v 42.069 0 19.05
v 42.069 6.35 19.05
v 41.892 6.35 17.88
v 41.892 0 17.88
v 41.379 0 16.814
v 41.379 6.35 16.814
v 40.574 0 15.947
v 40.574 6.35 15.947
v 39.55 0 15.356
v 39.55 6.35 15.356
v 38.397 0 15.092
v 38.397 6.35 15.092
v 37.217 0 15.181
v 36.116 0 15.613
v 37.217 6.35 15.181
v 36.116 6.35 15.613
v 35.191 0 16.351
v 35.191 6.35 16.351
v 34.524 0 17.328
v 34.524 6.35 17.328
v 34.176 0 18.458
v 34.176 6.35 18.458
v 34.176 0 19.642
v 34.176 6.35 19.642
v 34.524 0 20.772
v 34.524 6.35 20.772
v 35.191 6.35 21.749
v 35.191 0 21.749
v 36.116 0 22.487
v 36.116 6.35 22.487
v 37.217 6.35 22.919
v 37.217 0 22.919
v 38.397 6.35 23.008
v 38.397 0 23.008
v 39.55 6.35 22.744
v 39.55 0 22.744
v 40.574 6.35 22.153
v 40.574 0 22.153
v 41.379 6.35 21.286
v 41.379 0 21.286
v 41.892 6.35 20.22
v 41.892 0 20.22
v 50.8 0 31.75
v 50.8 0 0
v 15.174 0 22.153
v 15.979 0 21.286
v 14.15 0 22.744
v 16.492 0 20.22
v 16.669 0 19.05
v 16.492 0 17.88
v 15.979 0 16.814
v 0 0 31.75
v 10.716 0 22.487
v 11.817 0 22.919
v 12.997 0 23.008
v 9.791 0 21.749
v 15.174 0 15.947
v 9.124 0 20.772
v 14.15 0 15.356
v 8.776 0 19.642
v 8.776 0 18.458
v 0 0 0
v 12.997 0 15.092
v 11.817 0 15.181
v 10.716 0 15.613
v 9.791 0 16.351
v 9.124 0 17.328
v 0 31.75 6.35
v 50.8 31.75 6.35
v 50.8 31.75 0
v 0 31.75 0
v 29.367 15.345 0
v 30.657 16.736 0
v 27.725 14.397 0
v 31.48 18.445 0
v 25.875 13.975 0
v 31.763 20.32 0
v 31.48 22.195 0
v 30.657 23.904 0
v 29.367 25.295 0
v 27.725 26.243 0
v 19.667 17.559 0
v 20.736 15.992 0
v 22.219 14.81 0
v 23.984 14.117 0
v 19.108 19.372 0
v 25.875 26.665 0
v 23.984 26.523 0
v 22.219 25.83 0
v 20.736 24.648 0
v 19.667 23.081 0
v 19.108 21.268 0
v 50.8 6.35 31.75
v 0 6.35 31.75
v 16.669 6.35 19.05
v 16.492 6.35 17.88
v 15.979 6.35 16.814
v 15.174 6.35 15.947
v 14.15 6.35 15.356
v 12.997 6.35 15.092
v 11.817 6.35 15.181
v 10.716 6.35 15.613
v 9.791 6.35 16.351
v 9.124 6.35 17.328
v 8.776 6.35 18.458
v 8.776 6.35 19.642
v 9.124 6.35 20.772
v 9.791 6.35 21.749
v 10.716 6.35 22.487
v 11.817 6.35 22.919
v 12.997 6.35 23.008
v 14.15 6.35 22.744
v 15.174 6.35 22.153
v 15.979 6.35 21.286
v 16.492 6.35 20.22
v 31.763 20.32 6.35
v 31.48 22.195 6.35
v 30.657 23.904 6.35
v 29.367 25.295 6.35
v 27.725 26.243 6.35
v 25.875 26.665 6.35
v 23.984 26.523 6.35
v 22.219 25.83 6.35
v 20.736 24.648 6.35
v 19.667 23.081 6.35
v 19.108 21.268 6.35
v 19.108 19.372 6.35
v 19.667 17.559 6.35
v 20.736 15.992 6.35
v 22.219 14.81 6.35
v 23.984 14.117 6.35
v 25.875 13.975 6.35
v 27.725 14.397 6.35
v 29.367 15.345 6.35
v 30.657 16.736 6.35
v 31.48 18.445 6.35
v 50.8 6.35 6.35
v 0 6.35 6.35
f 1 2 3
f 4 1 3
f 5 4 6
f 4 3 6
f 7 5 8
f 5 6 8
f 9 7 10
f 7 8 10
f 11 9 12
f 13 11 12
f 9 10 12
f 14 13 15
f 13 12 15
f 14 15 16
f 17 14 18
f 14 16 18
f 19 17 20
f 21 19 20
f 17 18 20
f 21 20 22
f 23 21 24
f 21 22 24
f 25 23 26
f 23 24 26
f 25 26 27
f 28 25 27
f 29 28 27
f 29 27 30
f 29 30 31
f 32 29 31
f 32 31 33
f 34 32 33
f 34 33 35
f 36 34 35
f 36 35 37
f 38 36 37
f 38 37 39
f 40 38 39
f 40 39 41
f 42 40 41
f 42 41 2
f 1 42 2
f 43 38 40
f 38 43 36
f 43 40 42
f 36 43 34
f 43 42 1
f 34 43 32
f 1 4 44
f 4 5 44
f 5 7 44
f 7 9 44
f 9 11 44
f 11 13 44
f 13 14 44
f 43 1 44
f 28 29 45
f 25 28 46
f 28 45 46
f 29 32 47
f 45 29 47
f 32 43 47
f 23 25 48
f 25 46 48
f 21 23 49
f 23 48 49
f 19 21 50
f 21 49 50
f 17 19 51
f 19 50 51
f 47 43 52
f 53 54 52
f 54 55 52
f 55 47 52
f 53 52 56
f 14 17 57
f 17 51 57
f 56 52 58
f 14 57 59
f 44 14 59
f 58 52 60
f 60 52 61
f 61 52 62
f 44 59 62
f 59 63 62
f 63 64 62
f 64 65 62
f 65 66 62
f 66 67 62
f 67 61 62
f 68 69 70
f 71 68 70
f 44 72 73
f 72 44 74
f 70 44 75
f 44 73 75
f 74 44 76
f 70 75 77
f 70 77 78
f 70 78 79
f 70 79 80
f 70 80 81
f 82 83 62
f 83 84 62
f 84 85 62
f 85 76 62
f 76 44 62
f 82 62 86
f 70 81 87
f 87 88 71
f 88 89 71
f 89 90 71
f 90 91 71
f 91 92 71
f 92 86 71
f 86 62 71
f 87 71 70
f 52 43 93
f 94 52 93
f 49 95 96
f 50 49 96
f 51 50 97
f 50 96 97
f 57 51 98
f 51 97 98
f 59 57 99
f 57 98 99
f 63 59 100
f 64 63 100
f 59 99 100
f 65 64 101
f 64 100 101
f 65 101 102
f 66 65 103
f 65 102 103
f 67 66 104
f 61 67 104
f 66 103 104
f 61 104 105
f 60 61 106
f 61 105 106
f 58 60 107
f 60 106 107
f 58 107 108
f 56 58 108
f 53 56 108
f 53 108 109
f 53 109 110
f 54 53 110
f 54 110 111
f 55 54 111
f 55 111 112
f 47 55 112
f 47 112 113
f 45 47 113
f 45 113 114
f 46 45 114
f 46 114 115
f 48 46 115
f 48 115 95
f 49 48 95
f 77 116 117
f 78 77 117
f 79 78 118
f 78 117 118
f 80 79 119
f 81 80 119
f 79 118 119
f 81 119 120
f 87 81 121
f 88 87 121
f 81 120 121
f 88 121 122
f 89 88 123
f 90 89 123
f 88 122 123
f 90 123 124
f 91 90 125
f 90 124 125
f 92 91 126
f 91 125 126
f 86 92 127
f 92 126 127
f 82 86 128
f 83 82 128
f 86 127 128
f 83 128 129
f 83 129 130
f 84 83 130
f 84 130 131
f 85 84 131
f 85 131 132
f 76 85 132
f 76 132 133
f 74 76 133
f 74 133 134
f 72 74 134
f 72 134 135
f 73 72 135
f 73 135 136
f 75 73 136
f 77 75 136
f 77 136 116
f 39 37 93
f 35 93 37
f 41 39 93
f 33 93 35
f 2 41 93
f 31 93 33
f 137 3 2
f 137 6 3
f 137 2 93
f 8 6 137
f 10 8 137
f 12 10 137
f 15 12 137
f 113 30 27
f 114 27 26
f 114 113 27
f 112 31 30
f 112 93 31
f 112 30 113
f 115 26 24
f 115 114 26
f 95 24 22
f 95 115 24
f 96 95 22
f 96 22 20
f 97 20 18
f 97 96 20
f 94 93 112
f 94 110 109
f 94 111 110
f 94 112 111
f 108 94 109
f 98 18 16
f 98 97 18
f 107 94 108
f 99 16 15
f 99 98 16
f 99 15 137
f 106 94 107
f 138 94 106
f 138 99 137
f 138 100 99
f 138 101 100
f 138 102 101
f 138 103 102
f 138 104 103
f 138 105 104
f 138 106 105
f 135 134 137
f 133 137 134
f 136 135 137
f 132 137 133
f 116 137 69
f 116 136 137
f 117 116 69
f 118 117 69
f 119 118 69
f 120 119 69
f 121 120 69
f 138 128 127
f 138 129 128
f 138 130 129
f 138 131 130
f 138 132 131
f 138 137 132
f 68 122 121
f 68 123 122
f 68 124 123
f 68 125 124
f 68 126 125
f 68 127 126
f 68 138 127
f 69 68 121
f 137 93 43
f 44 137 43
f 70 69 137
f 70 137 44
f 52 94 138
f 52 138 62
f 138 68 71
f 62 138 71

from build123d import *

# Parameters (mm, degrees)
SKETCH1_W           = 25.4
SKETCH1_H           = 6.35
SKETCH1_W_2         = 6.35
SKETCH1_H_2         = 31.75
BOSS_EXTRUDE1_DEPTH = 50.8
CUT_EXTRUDE1_REACH  = 8.35
SKETCH2_R           = 6.3627
CUT_EXTRUDE2_REACH  = 8.35
SKETCH3_R           = 3.96875


with BuildPart() as part:
    # Sketch1 → Boss-Extrude1 (new body)
    with BuildSketch(Plane(origin=(0, 0, 0), x_dir=(0, 0, -1), z_dir=(1, 0, 0))):
        with Locations((-19.05, 3.175)):
            Rectangle(SKETCH1_W, SKETCH1_H)
        with Locations((-3.175, 15.875)):
            Rectangle(SKETCH1_W_2, SKETCH1_H_2)
    extrude(amount=BOSS_EXTRUDE1_DEPTH)

    # Sketch2 → Cut-Extrude1 (cut, up to next)
    with BuildSketch(Plane.XY.offset(6.35), mode=Mode.PRIVATE) as cut_extrude1_sk1:
        with Locations((25.4, 20.32)):
            Circle(SKETCH2_R)
    cut_extrude1_tool1 = extrude(cut_extrude1_sk1.sketch, amount=-CUT_EXTRUDE1_REACH, mode=Mode.PRIVATE) & part.part
    add(cut_extrude1_tool1.solids().sort_by_distance((25.4, 20.32, 6.35))[0], mode=Mode.SUBTRACT)

    # Sketch3 → Cut-Extrude2 (cut, up to next)
    with BuildSketch(Plane(origin=(0, 6.35, 0), x_dir=(1, 0, 0), z_dir=(0, 1, 0)), mode=Mode.PRIVATE) as cut_extrude2_sk1:
        with Locations((12.7, -19.05)):
            Circle(SKETCH3_R)
    cut_extrude2_tool1 = extrude(cut_extrude2_sk1.sketch, amount=-CUT_EXTRUDE2_REACH, mode=Mode.PRIVATE) & part.part
    add(cut_extrude2_tool1.solids().sort_by_distance((12.7, 6.35, 19.05))[0], mode=Mode.SUBTRACT)
    # Sketch3 → Cut-Extrude2 (cut, up to next)
    with BuildSketch(Plane(origin=(0, 6.35, 0), x_dir=(1, 0, 0), z_dir=(0, 1, 0)), mode=Mode.PRIVATE) as cut_extrude2_sk2:
        with Locations((38.1, -19.05)):
            Circle(SKETCH3_R)
    cut_extrude2_tool2 = extrude(cut_extrude2_sk2.sketch, amount=-CUT_EXTRUDE2_REACH, mode=Mode.PRIVATE) & part.part
    add(cut_extrude2_tool2.solids().sort_by_distance((38.1, 6.35, 19.05))[0], mode=Mode.SUBTRACT)


solid = part.part
